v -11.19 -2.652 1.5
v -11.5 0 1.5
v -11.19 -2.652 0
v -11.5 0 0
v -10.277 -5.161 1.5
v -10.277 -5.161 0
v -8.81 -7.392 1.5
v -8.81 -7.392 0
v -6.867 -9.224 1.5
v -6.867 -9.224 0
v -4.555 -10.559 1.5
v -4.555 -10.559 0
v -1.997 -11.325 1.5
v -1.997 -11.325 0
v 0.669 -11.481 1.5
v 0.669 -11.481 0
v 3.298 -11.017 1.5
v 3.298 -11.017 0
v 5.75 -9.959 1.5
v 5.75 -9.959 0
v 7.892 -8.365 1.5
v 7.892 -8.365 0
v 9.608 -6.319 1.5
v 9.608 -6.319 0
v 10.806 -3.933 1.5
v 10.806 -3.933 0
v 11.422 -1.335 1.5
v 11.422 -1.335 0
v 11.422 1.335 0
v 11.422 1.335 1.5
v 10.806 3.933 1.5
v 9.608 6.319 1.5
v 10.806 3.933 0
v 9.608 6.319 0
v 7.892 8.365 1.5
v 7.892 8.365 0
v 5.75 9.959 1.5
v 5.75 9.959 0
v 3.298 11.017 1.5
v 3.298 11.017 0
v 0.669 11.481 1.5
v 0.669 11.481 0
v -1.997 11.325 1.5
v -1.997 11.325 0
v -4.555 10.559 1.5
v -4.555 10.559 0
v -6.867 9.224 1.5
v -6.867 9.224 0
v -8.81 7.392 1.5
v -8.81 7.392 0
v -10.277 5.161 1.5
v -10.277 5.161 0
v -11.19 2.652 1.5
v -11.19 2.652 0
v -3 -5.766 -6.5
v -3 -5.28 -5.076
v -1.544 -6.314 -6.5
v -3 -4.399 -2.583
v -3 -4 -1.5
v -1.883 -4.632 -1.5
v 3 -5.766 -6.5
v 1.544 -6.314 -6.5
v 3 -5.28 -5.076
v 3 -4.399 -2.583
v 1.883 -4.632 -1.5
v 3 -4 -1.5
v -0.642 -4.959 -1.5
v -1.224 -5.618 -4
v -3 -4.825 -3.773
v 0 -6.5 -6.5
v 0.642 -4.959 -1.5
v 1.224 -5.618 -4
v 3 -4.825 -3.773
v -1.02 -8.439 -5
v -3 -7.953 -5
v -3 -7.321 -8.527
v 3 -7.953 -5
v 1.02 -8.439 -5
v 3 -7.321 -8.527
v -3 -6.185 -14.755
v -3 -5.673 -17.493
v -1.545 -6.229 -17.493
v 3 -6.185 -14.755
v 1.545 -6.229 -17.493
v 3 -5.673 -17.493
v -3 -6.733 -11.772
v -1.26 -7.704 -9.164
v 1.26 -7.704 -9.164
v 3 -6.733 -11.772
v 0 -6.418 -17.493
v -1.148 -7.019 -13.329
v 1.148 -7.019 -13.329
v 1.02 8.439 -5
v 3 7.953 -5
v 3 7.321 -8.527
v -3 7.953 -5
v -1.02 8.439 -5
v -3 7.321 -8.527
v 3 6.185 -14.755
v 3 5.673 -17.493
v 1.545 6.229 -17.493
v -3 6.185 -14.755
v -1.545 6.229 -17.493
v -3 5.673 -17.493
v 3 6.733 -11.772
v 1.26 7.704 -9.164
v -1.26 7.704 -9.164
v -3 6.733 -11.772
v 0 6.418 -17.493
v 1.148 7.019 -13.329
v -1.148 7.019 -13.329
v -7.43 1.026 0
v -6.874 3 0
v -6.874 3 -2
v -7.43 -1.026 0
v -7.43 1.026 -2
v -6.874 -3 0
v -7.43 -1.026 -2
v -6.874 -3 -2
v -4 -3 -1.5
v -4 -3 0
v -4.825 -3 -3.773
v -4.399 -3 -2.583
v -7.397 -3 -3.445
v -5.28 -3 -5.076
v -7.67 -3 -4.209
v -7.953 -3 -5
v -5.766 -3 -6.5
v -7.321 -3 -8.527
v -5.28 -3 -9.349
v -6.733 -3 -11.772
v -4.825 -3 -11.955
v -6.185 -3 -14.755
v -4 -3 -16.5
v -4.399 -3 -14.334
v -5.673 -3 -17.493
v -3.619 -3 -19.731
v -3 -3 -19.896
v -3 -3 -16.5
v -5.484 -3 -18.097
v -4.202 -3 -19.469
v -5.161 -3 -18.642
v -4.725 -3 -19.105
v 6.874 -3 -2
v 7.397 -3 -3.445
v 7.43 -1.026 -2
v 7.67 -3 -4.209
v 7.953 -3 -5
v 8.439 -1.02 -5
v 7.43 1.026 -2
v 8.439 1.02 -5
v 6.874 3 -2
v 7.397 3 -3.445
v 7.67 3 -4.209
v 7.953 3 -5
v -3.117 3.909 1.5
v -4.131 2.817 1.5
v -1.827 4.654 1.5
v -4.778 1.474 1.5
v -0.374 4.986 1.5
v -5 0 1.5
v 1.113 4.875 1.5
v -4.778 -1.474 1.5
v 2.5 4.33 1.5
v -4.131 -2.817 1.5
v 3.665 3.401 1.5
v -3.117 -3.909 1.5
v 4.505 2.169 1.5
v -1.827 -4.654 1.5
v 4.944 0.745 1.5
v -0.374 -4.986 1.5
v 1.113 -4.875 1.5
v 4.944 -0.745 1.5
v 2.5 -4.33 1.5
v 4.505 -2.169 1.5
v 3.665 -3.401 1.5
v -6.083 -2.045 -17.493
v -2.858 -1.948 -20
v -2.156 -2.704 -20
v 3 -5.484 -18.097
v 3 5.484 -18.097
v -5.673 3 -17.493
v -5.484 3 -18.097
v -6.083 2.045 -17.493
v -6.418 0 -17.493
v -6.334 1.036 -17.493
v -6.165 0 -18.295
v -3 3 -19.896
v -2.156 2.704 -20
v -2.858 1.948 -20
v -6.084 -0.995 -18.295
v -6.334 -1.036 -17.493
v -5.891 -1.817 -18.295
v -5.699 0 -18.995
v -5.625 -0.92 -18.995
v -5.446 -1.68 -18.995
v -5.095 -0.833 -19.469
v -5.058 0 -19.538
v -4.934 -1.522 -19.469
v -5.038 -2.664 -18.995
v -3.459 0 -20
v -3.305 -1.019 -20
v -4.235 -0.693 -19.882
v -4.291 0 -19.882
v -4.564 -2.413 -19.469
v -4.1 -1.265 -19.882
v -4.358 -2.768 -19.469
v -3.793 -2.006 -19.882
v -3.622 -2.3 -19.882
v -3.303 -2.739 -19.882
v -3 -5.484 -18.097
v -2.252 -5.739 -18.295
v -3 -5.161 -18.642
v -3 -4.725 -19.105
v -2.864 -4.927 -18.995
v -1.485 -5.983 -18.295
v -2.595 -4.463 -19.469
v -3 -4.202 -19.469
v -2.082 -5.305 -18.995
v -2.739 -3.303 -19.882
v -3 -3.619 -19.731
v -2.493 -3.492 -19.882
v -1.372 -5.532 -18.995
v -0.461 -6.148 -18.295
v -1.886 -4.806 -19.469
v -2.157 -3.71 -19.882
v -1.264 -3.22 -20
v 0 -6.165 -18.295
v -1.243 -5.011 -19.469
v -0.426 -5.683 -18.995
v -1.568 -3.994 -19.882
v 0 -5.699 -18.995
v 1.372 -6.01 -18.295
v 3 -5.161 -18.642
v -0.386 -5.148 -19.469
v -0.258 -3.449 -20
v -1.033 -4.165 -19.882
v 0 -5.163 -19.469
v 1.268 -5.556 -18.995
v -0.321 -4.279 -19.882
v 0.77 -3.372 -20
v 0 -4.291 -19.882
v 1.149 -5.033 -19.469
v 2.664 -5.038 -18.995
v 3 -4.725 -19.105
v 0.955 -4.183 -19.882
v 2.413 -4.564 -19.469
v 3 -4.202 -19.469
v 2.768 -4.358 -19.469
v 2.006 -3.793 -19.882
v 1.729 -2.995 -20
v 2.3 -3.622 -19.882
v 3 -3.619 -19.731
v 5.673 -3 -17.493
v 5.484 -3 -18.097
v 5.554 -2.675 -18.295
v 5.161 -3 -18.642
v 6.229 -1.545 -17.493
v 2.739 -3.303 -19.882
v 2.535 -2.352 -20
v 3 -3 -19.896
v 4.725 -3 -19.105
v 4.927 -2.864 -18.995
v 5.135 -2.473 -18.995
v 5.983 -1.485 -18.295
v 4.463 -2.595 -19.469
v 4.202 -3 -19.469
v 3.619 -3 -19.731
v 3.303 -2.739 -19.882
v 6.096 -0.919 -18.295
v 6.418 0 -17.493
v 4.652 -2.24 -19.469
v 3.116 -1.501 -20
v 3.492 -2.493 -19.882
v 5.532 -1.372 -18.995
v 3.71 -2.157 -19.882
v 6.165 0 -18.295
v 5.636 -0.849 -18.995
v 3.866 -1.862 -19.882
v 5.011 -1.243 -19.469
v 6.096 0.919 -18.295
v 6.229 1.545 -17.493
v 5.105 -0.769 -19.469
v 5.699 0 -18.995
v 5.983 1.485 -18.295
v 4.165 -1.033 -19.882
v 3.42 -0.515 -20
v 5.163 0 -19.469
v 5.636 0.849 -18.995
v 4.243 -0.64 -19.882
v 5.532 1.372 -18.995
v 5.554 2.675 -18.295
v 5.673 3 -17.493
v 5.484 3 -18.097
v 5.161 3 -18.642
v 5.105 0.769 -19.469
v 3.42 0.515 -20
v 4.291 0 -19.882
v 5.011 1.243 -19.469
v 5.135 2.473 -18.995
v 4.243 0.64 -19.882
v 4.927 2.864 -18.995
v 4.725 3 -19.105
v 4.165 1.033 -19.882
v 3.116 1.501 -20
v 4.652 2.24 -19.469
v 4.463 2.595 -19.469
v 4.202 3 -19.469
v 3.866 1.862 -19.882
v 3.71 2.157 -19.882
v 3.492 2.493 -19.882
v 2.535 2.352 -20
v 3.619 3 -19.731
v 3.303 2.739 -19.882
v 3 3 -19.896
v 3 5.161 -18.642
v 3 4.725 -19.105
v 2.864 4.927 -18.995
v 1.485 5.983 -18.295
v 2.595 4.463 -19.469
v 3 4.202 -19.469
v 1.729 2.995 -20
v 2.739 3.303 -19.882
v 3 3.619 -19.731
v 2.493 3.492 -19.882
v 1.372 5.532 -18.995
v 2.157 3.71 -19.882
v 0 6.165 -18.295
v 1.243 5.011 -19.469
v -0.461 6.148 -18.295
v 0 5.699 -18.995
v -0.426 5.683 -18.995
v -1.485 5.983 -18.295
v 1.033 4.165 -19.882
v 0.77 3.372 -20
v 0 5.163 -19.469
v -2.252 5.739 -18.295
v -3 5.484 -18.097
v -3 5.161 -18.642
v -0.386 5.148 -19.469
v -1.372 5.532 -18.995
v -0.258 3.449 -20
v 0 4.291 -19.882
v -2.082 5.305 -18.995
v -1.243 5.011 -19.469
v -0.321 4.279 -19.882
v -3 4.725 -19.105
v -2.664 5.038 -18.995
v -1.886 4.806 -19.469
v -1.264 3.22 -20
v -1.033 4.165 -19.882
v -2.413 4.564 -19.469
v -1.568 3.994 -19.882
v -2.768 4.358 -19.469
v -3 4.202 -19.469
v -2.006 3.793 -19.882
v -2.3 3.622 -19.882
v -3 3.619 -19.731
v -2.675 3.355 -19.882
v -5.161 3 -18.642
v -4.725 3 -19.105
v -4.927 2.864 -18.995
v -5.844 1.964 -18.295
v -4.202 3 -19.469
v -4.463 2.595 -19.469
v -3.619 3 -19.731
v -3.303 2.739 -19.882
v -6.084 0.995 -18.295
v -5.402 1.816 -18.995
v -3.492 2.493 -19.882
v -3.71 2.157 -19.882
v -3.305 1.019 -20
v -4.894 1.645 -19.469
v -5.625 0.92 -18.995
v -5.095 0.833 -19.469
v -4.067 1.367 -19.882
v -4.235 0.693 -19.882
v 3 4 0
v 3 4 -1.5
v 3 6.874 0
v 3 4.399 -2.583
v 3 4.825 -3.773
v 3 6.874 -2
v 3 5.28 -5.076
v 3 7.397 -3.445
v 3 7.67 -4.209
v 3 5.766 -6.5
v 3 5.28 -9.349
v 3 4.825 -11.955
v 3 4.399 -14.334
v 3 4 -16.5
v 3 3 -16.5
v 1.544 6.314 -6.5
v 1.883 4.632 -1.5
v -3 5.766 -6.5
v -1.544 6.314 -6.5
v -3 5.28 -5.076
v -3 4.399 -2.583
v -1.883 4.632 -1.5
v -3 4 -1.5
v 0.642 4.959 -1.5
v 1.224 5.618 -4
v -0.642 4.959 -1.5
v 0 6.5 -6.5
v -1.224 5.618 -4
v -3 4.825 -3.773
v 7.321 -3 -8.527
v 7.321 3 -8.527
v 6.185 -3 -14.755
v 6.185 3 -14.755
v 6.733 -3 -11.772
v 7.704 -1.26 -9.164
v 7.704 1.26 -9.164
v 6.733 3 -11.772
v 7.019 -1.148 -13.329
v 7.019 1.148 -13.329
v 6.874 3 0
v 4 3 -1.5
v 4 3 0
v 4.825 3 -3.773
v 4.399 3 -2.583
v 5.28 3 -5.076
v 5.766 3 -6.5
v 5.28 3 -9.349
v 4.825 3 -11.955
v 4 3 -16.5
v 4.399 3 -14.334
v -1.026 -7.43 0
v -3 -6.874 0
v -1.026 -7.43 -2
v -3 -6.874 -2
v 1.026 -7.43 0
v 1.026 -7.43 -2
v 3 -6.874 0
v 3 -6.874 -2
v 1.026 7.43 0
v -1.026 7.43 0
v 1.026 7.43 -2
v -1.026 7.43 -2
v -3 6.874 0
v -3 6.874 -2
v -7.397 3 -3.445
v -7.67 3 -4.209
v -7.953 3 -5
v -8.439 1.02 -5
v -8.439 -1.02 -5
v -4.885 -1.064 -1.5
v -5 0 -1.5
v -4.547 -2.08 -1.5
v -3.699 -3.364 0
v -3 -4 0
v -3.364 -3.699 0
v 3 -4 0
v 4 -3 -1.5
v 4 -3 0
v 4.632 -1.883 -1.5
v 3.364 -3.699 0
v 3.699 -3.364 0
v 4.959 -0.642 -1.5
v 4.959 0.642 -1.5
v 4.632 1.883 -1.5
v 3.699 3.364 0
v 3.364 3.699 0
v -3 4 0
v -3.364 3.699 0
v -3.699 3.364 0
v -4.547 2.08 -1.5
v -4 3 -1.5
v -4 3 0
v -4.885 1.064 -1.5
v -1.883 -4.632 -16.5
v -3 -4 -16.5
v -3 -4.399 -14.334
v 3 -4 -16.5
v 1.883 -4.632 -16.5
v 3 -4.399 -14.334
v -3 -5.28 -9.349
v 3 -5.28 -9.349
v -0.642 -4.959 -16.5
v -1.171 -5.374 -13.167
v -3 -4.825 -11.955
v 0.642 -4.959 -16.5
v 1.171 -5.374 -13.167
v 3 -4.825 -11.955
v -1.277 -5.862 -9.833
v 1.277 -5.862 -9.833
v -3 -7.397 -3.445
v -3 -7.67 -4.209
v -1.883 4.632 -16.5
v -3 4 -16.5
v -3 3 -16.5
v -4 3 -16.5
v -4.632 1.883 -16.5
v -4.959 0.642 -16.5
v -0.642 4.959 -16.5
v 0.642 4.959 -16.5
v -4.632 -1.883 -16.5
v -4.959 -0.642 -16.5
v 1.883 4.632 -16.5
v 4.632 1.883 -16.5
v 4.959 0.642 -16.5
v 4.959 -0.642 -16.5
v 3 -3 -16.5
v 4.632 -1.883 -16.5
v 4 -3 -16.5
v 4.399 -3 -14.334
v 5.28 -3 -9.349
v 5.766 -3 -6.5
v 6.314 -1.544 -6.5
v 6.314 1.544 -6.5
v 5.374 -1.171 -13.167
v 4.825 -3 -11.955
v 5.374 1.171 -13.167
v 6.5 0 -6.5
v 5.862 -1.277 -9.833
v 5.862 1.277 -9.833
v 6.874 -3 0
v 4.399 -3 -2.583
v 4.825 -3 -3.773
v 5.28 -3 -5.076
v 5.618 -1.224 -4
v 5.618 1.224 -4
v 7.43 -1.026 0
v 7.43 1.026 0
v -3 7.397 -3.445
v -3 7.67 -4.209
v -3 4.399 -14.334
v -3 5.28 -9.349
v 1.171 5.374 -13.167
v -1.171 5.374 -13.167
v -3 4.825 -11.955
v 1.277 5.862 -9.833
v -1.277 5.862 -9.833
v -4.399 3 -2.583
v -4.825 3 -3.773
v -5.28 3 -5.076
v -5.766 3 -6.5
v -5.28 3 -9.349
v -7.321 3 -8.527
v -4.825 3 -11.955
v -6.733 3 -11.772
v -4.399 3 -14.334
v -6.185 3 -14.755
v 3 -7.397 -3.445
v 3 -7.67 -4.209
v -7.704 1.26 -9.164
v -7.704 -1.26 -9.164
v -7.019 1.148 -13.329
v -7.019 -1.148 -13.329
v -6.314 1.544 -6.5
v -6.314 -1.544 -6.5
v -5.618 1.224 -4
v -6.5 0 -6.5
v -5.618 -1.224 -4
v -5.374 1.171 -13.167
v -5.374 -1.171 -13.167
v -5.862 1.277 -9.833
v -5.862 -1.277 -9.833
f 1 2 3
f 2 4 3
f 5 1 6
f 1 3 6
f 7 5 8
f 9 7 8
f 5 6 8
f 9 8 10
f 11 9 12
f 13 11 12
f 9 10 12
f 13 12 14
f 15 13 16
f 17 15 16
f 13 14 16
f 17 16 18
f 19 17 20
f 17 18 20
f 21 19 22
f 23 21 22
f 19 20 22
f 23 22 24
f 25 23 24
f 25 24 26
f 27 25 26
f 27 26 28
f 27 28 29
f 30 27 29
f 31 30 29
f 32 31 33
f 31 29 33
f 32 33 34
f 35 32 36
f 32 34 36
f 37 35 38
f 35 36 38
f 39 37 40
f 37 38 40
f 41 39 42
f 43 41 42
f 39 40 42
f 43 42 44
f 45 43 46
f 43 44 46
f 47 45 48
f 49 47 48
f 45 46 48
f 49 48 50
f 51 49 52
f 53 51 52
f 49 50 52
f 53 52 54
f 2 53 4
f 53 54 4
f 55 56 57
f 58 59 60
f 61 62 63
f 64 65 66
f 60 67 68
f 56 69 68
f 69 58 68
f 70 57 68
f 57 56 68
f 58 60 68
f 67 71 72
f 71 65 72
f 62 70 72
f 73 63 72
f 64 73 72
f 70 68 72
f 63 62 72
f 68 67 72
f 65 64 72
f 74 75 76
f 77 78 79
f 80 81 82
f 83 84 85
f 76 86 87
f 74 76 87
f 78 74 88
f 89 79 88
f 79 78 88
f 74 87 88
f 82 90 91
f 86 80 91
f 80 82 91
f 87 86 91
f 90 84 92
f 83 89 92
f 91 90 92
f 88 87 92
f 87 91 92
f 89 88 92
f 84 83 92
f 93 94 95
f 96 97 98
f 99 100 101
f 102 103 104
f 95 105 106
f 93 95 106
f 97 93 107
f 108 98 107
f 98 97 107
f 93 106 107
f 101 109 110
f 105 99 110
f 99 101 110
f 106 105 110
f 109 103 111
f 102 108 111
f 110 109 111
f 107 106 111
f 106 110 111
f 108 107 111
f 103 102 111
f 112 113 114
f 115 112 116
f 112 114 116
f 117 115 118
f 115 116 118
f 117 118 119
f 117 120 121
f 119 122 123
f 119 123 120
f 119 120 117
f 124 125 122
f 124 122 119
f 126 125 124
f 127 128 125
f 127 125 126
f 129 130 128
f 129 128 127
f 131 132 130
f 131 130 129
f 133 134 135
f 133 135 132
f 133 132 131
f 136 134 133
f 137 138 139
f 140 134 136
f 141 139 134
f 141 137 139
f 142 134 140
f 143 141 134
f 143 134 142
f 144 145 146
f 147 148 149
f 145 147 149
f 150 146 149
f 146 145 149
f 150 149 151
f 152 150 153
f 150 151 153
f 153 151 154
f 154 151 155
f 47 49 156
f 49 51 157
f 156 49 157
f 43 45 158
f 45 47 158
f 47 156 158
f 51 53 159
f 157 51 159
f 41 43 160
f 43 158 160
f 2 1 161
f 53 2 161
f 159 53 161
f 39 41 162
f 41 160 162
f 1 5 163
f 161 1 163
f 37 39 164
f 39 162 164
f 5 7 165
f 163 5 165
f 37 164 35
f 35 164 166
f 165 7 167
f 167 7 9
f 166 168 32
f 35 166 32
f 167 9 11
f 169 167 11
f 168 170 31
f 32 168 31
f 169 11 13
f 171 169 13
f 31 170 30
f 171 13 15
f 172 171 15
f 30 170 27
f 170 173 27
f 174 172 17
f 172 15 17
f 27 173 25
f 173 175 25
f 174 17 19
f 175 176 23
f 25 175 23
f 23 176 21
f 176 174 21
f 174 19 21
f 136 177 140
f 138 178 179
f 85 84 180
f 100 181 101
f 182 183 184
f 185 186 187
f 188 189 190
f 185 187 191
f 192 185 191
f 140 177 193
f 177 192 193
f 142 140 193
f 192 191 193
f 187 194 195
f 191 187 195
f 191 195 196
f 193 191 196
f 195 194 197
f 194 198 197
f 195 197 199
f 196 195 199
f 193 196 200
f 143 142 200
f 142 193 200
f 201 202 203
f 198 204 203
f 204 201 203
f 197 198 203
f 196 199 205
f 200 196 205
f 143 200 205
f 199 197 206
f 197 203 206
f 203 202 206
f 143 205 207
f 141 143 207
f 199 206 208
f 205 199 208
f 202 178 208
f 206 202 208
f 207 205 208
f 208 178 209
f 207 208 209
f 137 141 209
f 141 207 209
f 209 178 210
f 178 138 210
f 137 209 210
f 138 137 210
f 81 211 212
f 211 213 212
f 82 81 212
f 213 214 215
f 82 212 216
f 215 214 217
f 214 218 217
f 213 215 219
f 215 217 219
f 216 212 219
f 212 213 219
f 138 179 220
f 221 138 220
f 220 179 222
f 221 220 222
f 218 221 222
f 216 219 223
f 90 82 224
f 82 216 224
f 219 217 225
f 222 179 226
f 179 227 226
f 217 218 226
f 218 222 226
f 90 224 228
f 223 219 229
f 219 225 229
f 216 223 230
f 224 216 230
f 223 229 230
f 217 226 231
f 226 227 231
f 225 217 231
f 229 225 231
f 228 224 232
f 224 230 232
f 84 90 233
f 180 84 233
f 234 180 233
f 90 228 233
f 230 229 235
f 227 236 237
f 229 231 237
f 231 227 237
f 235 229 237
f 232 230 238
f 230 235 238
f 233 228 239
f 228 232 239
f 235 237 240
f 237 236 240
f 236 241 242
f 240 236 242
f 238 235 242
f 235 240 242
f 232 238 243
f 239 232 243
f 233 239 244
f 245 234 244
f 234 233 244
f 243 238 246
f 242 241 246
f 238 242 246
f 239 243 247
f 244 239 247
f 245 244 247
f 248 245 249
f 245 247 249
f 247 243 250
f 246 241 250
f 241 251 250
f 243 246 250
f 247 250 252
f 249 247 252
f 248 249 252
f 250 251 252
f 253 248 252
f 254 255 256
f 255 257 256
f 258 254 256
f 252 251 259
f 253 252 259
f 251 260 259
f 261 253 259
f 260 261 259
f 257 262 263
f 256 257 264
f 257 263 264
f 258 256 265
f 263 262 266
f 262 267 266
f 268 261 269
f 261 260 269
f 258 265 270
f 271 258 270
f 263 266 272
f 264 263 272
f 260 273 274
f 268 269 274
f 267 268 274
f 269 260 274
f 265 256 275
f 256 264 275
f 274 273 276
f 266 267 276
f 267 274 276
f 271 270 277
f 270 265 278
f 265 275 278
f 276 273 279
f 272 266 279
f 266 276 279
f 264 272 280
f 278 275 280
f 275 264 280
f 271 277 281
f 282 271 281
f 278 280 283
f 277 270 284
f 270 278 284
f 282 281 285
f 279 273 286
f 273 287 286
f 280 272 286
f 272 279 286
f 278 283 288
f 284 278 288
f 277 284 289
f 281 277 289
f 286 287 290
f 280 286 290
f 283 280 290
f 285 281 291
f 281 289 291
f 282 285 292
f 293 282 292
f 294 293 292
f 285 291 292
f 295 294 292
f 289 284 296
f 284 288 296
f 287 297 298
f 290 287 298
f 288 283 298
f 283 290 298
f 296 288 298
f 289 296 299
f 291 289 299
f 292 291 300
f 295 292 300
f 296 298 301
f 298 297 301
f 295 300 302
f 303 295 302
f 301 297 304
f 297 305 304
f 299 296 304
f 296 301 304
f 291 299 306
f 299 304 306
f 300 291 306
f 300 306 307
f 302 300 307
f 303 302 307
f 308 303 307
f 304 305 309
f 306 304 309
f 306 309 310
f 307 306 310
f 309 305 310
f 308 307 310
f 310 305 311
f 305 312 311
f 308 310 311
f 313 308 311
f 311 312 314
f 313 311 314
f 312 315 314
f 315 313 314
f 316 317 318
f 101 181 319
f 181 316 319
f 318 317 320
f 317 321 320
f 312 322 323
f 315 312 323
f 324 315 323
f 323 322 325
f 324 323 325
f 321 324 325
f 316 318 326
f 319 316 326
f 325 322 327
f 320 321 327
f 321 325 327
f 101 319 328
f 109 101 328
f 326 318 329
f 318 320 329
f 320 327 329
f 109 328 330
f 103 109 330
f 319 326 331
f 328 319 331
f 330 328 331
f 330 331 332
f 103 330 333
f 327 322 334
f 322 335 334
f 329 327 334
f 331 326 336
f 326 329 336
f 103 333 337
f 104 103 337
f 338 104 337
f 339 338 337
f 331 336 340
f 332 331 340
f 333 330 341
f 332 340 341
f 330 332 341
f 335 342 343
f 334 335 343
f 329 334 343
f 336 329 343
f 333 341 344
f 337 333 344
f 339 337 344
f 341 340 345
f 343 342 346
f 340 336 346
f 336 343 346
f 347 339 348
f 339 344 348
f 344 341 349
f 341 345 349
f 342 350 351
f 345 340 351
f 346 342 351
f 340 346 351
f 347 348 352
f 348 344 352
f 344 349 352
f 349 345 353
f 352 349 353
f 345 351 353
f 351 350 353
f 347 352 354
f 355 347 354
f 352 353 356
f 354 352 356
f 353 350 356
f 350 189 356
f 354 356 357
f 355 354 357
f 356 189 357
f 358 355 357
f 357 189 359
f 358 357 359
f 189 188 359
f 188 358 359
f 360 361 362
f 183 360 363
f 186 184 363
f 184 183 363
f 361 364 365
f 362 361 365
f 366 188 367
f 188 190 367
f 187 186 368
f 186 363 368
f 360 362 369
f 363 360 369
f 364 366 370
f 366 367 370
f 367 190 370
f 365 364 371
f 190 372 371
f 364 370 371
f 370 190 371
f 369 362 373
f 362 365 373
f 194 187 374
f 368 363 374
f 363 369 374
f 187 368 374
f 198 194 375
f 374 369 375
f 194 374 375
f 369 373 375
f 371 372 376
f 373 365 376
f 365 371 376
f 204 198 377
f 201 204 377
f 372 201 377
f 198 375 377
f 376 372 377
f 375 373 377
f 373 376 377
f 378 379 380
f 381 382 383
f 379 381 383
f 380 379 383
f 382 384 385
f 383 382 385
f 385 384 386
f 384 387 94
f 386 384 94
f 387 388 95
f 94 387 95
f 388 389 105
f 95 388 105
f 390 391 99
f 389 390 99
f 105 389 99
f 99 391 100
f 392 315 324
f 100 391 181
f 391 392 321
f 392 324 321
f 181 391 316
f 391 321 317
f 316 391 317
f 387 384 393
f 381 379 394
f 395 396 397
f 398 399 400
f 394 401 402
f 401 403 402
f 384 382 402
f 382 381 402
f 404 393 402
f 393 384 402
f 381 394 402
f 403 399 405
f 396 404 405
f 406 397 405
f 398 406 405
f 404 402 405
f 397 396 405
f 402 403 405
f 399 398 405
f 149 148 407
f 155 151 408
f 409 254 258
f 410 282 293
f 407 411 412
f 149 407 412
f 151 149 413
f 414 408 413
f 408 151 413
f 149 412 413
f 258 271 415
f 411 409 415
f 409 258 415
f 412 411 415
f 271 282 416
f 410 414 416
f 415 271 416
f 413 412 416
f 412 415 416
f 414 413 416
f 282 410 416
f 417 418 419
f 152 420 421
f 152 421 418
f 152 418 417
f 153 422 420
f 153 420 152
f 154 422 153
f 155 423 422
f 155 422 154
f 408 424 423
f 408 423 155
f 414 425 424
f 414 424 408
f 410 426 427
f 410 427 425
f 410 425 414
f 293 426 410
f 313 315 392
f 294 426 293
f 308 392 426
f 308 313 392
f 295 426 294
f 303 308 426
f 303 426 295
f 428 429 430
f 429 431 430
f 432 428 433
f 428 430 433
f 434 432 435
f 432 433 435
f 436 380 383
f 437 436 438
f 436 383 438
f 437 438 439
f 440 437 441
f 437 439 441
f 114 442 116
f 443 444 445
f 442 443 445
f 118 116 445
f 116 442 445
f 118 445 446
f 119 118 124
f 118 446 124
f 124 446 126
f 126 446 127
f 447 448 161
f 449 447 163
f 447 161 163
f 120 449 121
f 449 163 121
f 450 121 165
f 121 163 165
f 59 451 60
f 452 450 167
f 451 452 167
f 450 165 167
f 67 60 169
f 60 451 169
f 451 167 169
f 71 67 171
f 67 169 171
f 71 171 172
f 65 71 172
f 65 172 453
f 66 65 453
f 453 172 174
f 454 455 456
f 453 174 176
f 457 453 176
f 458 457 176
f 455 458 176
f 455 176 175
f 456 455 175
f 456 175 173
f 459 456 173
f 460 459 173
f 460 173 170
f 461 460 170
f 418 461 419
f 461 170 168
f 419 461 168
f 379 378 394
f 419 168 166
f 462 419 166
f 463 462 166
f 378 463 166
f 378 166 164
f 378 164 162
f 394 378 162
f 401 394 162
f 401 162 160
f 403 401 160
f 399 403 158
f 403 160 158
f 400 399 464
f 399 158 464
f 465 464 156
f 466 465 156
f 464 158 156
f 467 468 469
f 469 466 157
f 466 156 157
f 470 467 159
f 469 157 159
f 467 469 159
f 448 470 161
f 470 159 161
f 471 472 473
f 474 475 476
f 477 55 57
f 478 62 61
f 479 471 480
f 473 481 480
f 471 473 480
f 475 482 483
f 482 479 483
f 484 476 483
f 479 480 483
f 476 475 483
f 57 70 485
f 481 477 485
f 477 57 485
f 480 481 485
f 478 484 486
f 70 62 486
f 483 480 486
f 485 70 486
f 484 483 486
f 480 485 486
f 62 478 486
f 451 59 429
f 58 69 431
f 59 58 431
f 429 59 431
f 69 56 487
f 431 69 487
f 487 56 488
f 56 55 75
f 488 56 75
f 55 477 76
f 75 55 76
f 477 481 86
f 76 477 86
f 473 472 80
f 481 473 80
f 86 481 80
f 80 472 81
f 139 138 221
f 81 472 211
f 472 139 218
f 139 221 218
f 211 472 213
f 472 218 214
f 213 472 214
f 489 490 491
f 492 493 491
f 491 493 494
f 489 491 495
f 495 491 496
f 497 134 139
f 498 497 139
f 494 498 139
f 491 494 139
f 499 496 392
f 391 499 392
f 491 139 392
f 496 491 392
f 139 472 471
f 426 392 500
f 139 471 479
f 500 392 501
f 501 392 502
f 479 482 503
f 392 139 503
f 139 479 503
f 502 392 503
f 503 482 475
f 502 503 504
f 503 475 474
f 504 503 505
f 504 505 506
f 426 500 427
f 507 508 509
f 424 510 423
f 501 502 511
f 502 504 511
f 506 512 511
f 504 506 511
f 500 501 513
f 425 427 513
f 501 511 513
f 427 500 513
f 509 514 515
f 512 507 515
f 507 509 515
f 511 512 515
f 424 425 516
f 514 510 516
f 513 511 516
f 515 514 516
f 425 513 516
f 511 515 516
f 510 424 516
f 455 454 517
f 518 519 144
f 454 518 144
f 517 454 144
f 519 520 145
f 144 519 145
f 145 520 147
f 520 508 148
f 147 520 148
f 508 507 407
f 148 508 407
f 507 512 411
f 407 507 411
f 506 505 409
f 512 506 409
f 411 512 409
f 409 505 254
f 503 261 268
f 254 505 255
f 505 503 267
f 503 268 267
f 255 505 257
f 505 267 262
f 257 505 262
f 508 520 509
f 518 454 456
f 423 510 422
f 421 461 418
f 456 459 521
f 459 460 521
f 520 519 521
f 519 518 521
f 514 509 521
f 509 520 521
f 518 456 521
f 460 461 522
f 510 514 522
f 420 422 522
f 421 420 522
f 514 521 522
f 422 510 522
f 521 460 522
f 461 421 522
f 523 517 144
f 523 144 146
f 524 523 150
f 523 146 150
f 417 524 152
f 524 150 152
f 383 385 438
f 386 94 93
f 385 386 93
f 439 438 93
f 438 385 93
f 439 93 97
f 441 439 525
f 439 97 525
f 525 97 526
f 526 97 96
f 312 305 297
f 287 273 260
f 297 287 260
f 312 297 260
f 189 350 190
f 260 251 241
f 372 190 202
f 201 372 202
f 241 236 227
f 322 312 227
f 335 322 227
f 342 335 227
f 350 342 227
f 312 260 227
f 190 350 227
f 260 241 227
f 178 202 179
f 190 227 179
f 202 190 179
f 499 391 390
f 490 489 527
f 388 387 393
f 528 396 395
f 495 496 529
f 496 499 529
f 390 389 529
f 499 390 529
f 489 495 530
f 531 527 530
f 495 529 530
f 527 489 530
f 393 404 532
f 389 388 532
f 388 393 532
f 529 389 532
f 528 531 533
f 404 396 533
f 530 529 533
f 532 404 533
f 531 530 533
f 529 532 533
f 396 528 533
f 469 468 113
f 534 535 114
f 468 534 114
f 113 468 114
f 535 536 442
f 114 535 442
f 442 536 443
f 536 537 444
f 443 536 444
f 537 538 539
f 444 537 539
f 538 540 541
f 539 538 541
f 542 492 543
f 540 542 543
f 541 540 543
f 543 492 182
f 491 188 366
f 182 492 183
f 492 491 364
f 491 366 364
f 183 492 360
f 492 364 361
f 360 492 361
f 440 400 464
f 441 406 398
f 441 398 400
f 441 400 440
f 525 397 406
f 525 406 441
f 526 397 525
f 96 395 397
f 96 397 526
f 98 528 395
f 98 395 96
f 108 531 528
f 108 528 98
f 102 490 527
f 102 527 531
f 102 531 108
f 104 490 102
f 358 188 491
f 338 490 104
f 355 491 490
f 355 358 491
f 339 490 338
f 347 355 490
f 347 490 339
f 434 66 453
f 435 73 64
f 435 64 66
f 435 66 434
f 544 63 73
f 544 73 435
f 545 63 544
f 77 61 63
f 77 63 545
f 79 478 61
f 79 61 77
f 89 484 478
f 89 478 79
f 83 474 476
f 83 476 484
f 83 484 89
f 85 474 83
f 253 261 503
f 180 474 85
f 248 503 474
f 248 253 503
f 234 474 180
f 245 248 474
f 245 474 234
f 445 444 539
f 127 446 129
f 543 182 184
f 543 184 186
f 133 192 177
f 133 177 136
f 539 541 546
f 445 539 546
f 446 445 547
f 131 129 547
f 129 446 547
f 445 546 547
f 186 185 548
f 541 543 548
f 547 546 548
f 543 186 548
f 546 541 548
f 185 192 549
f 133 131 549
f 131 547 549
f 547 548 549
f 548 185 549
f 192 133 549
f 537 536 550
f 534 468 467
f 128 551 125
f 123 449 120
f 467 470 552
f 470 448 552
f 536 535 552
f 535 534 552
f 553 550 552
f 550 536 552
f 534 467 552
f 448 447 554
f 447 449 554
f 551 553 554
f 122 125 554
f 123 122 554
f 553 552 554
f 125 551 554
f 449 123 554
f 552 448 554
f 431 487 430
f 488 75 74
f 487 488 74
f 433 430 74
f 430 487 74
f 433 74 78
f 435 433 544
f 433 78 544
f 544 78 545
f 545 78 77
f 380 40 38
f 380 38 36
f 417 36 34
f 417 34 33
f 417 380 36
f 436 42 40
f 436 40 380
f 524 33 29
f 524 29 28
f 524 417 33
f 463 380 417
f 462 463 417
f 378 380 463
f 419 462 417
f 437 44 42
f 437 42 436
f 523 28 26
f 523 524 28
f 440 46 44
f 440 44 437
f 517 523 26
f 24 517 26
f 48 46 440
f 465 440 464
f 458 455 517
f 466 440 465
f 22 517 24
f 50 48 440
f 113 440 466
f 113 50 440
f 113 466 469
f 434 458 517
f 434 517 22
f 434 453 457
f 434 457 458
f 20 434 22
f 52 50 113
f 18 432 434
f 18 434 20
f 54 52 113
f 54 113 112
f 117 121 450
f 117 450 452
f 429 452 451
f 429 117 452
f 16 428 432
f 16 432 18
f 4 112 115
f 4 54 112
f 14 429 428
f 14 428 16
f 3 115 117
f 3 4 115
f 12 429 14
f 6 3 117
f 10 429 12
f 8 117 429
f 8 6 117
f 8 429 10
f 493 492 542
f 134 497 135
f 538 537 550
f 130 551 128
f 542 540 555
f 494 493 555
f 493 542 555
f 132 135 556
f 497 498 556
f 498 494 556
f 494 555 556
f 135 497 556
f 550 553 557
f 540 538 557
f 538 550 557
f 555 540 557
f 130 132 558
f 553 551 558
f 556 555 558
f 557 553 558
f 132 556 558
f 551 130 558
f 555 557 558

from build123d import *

# Parameters (mm, degrees)
FILLET_1_R               = 3
CUT_EXTRUDE_1_REACH      = 28.958
SKETCH_2_W               = 10.643557705
SKETCH_2_H               = 9.097593034
PATTERN_CIRCULAR_1_COUNT = 4


with BuildPart() as part:
    # ｽｹｯﾁ1 → 回転1 (revolve)
    with BuildSketch(Plane(origin=(0, 0, 0), x_dir=(0, 0, -1), z_dir=(1, 0, 0)), mode=Mode.PRIVATE) as revolve_1_sk:
        Polygon((0, 7.5), (2, 7.5), (5, 8.5), (20, 6), (20, 0), (16.5, 0), (16.5, 5), (6.5, 6.5), (1.5, 5), (-1.5, 5), (-1.5, 11.5), (0, 11.5), align=None)
    revolve(revolve_1_sk.sketch.rotate(Axis((0, 0, 0), (0, 0, 1)), 90), axis=Axis((0, 0, 0), (0, 0, 1)))

    # ﾌｨﾚｯﾄ1
    fillet_1_edges = [part.edges().sort_by_distance(p)[0] for p in [
        (6, 0, -20),
    ]]
    fillet(fillet_1_edges, radius=FILLET_1_R)

    # ｶｯﾄ - 押し出し1: up to this face of the body (flat: up to its plane)
    cut_extrude_1_end = Plane(part.part.faces().sort_by_distance((11.174730881, 0, 0))[0])
    # ｽｹｯﾁ2 → ｶｯﾄ - 押し出し1 (cut, up to the picked face)
    with BuildSketch(Plane(origin=(0, 0, -20), x_dir=(-1, 0, 0), z_dir=(0, 0, -1)), mode=Mode.PRIVATE) as cut_extrude_1_sk1:
        with Locations((8.321778852, 7.548796517)):
            Rectangle(SKETCH_2_W, SKETCH_2_H)
    cut_extrude_1_tool1 = split(extrude(cut_extrude_1_sk1.sketch, amount=-CUT_EXTRUDE_1_REACH, mode=Mode.PRIVATE), bisect_by=cut_extrude_1_end, keep=Keep.BOTH, mode=Mode.PRIVATE)
    cut_extrude_1 = cut_extrude_1_tool1.solids().sort_by(Axis((-8.321779, 7.548797, -20), (0, 0, 1)))[0]
    add(cut_extrude_1, mode=Mode.SUBTRACT)

    # 円形ﾊﾟﾀｰﾝ1: ｶｯﾄ - 押し出し1 ×4 about axis
    pattern_circular_1_axis = Axis((0, 0, 0), (0, 0, 1))
    for i in range(1, PATTERN_CIRCULAR_1_COUNT):
        add(cut_extrude_1.rotate(pattern_circular_1_axis, i * 360 / PATTERN_CIRCULAR_1_COUNT), mode=Mode.SUBTRACT)


solid = part.part
